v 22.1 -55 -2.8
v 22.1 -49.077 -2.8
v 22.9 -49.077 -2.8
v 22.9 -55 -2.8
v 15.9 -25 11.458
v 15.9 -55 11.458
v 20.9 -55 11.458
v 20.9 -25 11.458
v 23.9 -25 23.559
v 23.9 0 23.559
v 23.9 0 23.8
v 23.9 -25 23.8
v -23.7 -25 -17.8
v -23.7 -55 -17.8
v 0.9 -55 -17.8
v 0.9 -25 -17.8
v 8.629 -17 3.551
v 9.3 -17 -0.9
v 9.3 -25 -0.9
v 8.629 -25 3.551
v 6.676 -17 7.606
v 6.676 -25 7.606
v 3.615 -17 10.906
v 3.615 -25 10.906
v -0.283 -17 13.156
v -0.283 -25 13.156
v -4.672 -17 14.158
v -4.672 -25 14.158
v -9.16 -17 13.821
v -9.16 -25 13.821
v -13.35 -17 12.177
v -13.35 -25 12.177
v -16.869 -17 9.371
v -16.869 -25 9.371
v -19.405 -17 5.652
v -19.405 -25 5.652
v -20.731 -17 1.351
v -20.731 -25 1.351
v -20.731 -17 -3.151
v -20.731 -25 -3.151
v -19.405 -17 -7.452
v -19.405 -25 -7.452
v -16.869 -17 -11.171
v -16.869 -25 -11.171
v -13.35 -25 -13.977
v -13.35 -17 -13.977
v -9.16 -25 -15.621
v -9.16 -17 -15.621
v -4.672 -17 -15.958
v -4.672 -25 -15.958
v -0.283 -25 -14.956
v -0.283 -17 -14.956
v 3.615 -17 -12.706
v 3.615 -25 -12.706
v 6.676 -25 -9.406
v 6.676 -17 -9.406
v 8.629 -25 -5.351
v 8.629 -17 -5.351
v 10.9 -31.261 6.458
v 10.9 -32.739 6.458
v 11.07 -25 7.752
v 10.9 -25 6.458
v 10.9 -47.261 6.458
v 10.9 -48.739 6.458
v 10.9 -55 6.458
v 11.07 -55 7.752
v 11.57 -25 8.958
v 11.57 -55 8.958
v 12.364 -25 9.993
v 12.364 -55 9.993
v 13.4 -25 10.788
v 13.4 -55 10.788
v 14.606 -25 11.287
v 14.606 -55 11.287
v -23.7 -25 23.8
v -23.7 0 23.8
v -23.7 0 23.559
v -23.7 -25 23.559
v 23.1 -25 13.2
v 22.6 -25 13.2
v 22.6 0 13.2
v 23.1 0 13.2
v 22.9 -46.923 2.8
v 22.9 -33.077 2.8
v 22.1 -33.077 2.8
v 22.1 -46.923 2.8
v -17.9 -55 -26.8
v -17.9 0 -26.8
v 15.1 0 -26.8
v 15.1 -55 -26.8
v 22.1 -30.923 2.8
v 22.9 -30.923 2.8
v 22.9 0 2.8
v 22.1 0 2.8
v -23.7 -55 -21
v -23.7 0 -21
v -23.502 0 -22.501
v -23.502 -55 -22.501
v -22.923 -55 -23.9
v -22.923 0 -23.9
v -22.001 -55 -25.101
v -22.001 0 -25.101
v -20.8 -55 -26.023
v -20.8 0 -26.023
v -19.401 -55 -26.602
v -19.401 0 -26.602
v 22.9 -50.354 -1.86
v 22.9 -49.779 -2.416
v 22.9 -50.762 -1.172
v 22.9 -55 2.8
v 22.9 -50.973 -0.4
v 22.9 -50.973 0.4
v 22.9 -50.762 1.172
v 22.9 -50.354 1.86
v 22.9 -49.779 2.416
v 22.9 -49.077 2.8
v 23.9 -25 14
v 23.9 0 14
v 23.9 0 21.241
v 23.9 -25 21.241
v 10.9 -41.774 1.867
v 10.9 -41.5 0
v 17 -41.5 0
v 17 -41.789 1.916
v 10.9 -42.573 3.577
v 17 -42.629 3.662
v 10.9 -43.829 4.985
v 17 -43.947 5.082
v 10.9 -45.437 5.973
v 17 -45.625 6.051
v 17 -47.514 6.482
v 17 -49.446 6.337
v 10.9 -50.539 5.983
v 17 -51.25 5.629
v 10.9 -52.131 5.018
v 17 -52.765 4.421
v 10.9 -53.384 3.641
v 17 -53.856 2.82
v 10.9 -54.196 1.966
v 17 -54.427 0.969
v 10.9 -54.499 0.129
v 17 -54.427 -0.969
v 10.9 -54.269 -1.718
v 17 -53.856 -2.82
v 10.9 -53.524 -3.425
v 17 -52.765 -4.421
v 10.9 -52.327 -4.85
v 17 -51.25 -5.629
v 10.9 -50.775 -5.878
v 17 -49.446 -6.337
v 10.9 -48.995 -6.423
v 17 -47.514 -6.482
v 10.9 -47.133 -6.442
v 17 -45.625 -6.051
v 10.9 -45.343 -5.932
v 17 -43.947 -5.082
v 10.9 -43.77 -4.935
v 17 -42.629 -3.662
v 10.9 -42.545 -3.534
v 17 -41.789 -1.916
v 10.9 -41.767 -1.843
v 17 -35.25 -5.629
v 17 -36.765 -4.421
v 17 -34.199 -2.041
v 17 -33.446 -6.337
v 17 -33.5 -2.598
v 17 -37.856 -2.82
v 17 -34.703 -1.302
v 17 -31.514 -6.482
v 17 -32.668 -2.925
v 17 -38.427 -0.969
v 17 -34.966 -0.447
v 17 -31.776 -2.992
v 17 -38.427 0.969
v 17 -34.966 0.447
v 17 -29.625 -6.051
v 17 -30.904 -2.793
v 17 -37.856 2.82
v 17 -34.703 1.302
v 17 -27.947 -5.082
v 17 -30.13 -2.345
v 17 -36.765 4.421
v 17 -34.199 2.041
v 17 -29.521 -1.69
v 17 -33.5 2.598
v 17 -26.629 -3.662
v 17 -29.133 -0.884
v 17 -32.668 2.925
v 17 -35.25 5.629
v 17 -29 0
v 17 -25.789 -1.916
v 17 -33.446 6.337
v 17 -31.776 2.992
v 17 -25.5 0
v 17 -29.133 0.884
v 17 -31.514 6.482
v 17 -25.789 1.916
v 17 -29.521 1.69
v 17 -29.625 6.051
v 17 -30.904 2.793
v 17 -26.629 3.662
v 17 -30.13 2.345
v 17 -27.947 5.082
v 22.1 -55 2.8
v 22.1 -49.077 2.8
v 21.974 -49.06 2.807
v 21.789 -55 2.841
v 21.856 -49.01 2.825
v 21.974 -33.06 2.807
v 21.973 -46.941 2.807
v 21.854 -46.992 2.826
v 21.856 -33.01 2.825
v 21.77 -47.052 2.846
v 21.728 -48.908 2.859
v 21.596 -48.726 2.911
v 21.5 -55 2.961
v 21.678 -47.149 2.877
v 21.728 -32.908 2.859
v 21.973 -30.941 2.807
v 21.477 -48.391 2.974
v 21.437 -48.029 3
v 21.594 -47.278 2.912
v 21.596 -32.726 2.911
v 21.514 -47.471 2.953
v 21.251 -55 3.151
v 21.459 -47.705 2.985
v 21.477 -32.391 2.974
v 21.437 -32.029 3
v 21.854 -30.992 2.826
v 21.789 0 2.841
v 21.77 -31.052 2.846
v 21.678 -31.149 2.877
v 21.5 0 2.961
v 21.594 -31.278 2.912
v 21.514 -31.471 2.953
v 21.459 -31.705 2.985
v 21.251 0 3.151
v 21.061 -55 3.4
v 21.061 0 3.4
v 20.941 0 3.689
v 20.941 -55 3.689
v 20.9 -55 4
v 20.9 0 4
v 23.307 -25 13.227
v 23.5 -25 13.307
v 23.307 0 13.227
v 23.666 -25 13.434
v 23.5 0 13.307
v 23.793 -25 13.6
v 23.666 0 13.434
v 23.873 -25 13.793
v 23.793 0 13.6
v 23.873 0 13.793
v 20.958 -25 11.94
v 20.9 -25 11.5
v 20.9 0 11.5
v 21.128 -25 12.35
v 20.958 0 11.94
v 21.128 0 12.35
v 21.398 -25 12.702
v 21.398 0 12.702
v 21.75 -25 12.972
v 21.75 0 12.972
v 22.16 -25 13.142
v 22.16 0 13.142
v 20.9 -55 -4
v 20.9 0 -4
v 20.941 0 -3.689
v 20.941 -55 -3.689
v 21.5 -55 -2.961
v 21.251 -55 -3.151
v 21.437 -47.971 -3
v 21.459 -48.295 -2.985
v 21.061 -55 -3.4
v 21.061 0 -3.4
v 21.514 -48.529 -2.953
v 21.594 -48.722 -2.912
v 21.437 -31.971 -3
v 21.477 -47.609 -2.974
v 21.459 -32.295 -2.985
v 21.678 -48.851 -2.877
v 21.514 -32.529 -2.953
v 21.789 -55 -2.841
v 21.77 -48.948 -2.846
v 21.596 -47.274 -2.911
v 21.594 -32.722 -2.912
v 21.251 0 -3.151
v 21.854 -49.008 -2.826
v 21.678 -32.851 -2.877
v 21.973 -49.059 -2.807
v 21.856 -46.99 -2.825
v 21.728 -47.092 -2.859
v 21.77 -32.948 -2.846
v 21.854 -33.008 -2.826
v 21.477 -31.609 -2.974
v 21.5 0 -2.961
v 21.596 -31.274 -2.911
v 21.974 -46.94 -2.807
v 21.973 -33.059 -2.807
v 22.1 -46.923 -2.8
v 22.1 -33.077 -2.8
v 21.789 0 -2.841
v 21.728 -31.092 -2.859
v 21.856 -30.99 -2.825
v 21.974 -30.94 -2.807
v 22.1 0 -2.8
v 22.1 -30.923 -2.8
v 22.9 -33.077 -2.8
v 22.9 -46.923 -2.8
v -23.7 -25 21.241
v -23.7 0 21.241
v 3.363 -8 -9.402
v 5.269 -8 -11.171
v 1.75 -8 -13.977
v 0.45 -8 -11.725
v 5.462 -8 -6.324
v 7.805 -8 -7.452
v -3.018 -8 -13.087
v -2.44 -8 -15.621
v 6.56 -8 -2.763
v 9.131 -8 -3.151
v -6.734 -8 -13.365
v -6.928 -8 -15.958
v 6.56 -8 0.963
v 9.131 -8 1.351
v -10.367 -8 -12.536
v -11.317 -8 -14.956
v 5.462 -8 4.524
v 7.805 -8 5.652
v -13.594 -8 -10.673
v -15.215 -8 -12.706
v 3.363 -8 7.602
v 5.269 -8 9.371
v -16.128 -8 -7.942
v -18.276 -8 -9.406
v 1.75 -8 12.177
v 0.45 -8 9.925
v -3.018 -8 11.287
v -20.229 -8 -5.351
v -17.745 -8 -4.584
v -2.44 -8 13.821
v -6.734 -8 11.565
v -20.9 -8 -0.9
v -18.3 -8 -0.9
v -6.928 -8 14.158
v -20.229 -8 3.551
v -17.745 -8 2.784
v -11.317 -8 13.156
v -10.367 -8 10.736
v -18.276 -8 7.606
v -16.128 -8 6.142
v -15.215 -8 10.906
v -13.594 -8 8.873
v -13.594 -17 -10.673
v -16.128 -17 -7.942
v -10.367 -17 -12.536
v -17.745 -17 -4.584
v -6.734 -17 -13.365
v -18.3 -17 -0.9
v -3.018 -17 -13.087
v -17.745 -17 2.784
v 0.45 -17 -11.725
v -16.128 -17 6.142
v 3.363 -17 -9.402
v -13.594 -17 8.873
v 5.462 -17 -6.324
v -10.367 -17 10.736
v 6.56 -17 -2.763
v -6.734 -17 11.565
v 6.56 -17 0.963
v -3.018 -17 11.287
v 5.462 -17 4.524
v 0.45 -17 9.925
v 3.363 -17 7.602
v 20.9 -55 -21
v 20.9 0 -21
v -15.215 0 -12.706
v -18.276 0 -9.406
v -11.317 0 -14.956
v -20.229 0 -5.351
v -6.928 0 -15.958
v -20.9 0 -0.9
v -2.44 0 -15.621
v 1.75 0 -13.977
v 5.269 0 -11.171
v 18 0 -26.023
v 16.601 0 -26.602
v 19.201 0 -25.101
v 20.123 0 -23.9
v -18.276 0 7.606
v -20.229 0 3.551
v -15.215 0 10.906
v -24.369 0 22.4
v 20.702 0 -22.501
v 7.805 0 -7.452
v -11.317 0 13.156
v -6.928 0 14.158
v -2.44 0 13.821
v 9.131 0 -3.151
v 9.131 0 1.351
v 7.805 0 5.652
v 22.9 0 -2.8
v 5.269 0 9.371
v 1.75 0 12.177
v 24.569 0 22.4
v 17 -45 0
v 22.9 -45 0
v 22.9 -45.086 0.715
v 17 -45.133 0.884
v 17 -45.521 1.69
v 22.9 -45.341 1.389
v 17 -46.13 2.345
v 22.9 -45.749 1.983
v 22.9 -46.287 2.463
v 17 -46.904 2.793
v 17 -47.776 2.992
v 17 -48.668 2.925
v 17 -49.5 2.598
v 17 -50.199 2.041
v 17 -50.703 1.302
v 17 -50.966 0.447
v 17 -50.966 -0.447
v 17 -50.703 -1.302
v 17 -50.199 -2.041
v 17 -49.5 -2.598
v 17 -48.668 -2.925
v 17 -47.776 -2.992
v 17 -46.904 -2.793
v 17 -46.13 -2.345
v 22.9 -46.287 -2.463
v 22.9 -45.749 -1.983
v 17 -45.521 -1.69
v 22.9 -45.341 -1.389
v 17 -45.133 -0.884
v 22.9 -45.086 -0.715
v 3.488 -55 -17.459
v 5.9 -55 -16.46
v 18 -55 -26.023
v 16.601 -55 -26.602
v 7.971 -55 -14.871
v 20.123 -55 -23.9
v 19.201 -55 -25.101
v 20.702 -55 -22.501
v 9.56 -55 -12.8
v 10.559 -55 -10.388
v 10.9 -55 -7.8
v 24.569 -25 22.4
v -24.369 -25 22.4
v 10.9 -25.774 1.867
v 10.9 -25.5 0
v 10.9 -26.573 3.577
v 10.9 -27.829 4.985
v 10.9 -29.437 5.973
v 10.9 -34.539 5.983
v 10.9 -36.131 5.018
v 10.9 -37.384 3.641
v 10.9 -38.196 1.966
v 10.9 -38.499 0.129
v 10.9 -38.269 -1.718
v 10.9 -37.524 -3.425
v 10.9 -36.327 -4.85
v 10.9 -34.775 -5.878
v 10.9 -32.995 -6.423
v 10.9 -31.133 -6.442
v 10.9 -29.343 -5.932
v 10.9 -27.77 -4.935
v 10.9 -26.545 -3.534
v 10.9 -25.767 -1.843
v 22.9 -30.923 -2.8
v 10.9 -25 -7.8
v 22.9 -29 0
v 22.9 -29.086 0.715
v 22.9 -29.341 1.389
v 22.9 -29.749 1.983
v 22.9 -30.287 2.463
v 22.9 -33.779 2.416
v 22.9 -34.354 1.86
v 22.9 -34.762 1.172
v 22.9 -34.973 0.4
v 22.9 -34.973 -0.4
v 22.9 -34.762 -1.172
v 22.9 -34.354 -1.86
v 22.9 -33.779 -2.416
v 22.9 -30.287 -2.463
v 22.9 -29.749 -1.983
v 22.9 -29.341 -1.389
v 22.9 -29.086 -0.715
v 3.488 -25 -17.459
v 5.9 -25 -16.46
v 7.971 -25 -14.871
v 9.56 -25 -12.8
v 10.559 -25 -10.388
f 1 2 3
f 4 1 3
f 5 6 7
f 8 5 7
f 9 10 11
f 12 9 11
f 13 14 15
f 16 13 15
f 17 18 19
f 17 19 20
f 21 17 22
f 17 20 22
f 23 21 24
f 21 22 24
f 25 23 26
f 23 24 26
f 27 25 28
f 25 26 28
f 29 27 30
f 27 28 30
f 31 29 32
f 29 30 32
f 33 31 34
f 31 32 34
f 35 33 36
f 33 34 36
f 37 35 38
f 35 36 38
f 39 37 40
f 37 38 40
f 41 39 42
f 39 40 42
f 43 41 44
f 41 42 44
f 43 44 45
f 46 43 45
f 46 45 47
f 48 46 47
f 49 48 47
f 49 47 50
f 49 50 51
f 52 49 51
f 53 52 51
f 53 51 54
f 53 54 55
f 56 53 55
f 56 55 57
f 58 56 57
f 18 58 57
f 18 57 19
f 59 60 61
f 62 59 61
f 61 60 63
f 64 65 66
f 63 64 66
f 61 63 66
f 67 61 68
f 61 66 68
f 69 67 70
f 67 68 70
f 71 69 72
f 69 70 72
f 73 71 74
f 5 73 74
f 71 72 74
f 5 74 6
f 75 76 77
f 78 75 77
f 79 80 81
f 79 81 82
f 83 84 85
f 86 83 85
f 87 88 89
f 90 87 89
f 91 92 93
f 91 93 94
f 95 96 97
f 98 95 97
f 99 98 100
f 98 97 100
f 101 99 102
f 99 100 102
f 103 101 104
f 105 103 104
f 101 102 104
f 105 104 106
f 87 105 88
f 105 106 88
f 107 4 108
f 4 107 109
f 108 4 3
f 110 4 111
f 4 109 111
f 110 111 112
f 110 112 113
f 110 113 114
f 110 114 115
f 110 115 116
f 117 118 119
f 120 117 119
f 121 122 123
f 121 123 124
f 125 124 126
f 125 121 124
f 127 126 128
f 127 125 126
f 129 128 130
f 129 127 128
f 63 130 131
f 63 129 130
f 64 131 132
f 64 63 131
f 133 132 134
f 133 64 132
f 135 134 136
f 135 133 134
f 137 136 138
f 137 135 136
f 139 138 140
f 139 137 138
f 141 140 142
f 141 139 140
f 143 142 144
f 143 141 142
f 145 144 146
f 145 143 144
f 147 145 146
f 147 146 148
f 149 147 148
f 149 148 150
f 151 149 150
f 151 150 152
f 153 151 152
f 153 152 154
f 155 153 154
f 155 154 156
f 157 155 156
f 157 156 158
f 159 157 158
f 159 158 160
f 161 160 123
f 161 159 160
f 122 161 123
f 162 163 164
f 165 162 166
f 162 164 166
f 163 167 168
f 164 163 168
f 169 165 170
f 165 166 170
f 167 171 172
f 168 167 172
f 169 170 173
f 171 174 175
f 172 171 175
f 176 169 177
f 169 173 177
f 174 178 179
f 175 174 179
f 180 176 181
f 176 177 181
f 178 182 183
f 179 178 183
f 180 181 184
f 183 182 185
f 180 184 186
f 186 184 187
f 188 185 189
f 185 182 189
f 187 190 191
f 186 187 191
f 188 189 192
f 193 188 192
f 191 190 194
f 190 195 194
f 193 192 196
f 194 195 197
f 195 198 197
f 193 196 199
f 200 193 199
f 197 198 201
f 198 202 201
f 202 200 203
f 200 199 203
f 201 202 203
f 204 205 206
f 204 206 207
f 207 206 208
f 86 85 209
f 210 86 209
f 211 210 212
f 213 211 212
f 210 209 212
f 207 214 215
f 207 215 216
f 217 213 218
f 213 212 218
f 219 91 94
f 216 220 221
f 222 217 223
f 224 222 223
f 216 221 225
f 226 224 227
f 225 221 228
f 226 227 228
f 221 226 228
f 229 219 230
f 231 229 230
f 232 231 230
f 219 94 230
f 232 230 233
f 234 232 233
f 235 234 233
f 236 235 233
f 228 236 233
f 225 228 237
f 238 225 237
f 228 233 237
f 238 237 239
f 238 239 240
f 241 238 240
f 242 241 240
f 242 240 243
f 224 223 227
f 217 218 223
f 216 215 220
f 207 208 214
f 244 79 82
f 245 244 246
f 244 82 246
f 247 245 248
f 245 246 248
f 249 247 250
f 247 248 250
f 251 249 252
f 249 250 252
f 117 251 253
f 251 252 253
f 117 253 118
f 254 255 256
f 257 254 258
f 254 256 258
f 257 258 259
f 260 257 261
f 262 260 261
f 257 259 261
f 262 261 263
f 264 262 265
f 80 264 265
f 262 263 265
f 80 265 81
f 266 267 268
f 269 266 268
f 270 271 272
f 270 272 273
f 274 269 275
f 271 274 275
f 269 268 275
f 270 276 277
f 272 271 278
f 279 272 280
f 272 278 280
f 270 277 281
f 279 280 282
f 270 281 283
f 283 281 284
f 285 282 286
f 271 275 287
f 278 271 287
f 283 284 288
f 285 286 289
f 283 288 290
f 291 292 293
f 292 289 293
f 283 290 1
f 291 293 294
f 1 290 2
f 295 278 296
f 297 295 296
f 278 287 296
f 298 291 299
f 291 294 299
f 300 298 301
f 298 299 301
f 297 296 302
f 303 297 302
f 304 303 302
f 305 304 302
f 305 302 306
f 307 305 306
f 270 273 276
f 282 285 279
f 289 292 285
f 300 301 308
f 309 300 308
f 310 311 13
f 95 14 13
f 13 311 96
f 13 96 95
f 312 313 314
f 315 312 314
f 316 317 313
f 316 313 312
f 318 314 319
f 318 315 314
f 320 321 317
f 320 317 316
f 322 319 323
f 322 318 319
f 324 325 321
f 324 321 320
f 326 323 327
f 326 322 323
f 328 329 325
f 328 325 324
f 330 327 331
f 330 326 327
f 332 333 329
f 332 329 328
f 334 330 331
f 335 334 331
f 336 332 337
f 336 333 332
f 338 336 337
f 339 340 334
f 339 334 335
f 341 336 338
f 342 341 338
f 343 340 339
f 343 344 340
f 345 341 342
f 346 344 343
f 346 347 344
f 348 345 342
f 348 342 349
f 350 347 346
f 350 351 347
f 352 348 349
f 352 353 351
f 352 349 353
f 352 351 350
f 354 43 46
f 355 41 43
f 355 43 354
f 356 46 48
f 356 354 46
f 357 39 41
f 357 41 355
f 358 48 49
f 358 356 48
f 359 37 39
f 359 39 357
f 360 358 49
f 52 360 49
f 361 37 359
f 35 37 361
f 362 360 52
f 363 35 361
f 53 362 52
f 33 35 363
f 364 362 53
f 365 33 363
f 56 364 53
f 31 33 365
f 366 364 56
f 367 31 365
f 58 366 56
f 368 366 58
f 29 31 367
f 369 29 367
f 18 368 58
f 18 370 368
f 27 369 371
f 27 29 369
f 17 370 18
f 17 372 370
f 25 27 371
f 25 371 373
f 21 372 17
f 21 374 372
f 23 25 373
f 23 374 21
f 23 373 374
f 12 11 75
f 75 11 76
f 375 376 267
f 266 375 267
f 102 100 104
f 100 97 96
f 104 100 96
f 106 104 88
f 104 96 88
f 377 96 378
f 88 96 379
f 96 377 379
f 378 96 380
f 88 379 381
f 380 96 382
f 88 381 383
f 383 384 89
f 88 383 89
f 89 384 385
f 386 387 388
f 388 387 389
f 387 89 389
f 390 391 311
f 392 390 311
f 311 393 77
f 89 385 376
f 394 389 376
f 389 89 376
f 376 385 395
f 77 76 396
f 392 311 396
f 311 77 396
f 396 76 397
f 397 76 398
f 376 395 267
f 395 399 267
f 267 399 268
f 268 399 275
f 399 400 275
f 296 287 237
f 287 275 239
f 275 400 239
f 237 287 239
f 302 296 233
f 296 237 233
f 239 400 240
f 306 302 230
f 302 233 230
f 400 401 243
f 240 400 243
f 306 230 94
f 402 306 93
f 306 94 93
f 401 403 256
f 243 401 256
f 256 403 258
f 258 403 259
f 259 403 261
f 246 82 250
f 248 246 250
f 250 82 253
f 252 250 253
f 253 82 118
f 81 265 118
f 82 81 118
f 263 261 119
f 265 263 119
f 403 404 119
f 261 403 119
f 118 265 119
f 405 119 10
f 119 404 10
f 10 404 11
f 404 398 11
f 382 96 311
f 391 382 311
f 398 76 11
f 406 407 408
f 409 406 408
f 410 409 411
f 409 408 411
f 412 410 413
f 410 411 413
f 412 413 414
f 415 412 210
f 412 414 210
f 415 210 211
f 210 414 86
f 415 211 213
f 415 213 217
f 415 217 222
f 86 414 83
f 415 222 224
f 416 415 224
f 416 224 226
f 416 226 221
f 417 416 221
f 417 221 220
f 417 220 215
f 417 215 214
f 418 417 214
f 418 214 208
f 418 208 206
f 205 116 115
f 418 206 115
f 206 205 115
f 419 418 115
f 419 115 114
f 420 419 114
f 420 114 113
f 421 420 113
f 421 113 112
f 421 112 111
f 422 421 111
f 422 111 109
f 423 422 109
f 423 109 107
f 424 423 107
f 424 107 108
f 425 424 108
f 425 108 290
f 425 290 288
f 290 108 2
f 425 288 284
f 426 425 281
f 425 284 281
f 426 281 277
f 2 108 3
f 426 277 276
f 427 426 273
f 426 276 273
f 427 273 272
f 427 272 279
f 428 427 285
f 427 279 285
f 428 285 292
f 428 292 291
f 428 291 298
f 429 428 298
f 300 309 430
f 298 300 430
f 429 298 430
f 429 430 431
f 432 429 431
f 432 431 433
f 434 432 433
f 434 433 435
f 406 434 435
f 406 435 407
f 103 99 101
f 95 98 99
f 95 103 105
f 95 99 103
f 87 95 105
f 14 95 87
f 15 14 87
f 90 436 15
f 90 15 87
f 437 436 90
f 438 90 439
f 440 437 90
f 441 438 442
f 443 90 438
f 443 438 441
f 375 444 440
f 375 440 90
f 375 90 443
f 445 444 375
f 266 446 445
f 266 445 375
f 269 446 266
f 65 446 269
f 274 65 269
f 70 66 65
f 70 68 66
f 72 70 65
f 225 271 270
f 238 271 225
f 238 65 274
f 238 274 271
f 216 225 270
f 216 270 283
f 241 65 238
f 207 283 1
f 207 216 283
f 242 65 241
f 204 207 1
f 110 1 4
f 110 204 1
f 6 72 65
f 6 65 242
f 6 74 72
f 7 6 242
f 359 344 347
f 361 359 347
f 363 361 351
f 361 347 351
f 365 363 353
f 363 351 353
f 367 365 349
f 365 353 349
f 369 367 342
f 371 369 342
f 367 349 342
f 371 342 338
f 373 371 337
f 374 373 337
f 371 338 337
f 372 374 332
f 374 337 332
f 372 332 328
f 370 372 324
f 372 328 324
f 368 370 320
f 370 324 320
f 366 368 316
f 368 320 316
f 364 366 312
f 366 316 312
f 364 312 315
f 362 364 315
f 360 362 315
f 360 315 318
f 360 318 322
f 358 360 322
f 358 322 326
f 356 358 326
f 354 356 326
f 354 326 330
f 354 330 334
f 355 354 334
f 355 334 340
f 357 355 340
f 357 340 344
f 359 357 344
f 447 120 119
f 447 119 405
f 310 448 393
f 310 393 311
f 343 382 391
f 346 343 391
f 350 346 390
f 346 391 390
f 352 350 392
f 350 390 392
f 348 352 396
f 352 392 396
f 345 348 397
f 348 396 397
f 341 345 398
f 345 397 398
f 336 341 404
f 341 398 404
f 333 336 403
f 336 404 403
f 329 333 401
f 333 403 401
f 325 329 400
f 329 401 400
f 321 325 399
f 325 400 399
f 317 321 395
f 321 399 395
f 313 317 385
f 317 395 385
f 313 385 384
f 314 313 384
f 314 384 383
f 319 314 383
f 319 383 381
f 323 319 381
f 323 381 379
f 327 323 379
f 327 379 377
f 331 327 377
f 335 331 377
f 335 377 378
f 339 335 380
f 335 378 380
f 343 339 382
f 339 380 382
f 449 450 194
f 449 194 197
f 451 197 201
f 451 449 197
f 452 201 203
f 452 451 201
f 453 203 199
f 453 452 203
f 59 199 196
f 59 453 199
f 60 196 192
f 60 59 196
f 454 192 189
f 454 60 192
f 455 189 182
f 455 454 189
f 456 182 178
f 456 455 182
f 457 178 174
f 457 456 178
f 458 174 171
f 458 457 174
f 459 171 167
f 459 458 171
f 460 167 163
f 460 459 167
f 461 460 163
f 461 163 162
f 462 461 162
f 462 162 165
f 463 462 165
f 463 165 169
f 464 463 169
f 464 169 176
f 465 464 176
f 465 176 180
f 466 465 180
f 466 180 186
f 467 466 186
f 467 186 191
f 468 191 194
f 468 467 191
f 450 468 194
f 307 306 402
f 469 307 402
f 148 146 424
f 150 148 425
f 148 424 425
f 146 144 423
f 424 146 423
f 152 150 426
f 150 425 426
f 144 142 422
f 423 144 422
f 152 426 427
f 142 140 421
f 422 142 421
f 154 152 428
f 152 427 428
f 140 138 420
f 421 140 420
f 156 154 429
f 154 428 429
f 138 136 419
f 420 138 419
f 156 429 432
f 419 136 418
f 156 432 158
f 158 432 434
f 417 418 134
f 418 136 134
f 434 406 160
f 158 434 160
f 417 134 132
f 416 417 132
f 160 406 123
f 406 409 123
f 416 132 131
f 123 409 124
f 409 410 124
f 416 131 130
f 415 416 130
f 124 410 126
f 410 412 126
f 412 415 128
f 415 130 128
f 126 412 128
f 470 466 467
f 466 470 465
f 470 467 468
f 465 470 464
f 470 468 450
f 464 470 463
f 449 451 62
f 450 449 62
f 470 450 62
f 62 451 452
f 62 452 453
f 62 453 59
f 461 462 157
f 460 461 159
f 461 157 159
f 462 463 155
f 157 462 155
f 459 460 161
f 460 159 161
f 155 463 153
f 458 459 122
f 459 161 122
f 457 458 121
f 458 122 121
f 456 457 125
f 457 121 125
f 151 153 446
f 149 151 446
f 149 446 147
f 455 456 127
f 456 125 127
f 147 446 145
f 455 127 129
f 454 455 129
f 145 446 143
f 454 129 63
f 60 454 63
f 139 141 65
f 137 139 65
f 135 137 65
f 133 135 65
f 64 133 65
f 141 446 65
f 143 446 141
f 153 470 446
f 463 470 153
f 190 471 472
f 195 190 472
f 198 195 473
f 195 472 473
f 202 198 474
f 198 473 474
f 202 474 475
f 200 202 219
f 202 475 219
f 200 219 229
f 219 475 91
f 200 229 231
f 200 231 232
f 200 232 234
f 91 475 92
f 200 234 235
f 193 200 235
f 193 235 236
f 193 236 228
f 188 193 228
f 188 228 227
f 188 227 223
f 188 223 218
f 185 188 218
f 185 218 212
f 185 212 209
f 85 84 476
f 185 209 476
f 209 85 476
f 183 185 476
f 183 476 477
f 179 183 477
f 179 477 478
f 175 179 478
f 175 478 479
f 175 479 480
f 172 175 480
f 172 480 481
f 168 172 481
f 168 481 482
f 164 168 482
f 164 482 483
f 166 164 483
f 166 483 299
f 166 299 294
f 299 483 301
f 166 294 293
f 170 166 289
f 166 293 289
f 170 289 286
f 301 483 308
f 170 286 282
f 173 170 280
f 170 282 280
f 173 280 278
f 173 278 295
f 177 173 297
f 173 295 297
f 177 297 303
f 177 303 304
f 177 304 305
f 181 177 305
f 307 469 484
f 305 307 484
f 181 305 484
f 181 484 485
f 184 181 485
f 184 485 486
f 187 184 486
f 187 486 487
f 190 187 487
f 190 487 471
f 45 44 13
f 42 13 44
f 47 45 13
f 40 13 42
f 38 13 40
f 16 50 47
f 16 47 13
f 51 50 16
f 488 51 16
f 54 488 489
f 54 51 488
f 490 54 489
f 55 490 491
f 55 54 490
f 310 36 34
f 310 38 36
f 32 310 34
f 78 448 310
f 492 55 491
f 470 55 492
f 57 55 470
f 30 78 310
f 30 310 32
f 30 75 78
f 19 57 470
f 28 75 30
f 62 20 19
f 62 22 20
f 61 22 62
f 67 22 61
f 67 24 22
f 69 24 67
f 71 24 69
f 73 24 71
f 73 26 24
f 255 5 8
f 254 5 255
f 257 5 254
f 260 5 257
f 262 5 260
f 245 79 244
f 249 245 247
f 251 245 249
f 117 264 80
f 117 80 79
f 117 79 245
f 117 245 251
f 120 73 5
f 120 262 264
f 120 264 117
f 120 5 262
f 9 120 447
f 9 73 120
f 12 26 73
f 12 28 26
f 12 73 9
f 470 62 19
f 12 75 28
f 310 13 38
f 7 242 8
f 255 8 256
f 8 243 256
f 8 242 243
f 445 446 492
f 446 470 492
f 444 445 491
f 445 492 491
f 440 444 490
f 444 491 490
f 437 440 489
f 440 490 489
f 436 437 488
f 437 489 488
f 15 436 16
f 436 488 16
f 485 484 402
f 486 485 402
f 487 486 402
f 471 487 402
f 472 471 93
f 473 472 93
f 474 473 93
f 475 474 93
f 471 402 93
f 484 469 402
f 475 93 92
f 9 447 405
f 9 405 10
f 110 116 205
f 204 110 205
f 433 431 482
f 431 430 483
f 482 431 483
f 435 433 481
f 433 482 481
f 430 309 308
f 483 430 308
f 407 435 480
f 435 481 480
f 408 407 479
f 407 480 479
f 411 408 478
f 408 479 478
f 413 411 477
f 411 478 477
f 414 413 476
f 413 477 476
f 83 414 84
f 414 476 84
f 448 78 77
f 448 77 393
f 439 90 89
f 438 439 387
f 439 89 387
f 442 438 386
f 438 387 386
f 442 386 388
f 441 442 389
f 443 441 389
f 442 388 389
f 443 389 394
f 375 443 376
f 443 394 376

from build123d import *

# Parameters (mm, degrees)
F1_DEPTH  = 55
F3_DEPTH  = 30
F4_R      = 3
F5_DEPTH  = 25
F6_R      = 12.5
F7_DEPTH  = 25
F8_R      = 15.1
F9_DEPTH  = 38
F10_R     = 15.1
F11_DEPTH = 8
F12_R     = 6.5
F13_DEPTH = 17
F14_R     = 10


with BuildPart() as f1:
    # F0 (on Front) → F1 (new body)
    with BuildSketch(Plane.XZ):
        with BuildLine():
            Line((-23.699999, 23.799999), (-23.699999, 23.558845))
            Line((-23.699999, 23.558845), (-24.369059, 22.399999))
            Line((-24.369059, 22.399999), (-23.699999, 21.241153))
            Line((-23.699999, 21.241153), (-23.699999, -21.000001))
            ThreePointArc((-23.699999, -21.000001), (-22.001218, -25.10122), (-17.899999, -26.8))
            Line((-17.899999, -26.8), (15.100001, -26.8))
            ThreePointArc((15.100001, -26.8), (19.20122, -25.10122), (20.9, -21.000001))
            Line((20.9, -21.000001), (20.9, -4.000001))
            ThreePointArc((20.9, -4.000001), (21.251472, -3.151472), (22.100001, -2.8))
            Line((22.100001, -2.8), (22.9, -2.8))
            Line((22.9, -2.8), (22.9, 2.799999))
            Line((22.9, 2.799999), (22.100001, 2.799999))
            ThreePointArc((22.100001, 2.799999), (21.251472, 3.151471), (20.9, 3.999999))
            Line((20.9, 3.999999), (20.9, 11.499999))
            ThreePointArc((20.9, 11.499999), (21.397919, 12.702081), (22.600001, 13.2))
            Line((22.600001, 13.2), (23.100001, 13.2))
            ThreePointArc((23.100001, 13.2), (23.665686, 13.434314), (23.9, 13.999999))
            Line((23.9, 13.999999), (23.9, 21.241153))
            Line((23.9, 21.241153), (24.56906, 22.399999))
            Line((24.56906, 22.399999), (23.9, 23.558845))
            Line((23.9, 23.558845), (23.9, 23.799999))
            Line((23.9, 23.799999), (-23.699999, 23.799999))
        make_face()
    extrude(amount=F1_DEPTH)

    # F2 (on face) → F3 (cut)
    with BuildSketch(Plane.XZ.offset(55)):
        with BuildLine():
            Line((15.9, 11.457851), (26.682628, 11.457851))
            Line((26.682628, 11.457851), (26.682628, 26.709846))
            Line((26.682628, 26.709846), (-26.825872, 26.709846))
            Line((-26.825872, 26.709846), (-26.825872, -17.8))
            Line((-26.825872, -17.8), (5.9, -17.8))
            Line((5.9, -17.8), (10.9, -17.8))
            Line((10.9, -17.8), (10.9, -11.8))
            Line((10.9, -11.8), (10.9, 6.457851))
            ThreePointArc((10.9, 6.457851), (12.364466, 9.993385), (15.9, 11.457851))
        make_face()
    extrude(amount=-F3_DEPTH, mode=Mode.SUBTRACT)

    # F4 (on face) → F5 (cut)
    with BuildSketch(Plane.YZ.offset(22.9)):
        with Locations((-48, -1e-06)):
            Circle(F4_R)
        with Locations((-32, -1e-06)):
            Circle(F4_R)
    extrude(amount=-F5_DEPTH, mode=Mode.SUBTRACT)

    # F6 (on face) → F7 (cut, through all)
    with BuildSketch(Plane(origin=(0, 0, 0), x_dir=(-1, 0, 0), z_dir=(0, 1, 0))):
        with Locations((5.799999, -0.9)):
            Circle(F6_R)
    extrude(amount=-F7_DEPTH, mode=Mode.SUBTRACT)

    # F8 (on face) → F9 (cut)
    with BuildSketch(Plane.XZ.offset(55)):
        with Locations((-5.799999, -0.9)):
            Circle(F8_R)
    extrude(amount=-F9_DEPTH, mode=Mode.SUBTRACT)

    # F10 (on face) → F11 (cut)
    with BuildSketch(Plane(origin=(0, 0, 0), x_dir=(-1, 0, 0), z_dir=(0, 1, 0))):
        with Locations((5.799999, -0.9)):
            Circle(F10_R)
    extrude(amount=-F11_DEPTH, mode=Mode.SUBTRACT)

    # F12 (on Right) → F13 (cut)
    with BuildSketch(Plane.YZ):
        with Locations((-32, 0)):
            Circle(F12_R)
        with Locations((-48, 0)):
            Circle(F12_R)
    extrude(amount=F13_DEPTH, mode=Mode.SUBTRACT)

    # F14
    f14_edges = [f1.edges().sort_by_distance(p)[0] for p in [
        (10.9, -40, -17.8),
    ]]
    fillet(f14_edges, radius=F14_R)


solid = f1.part
